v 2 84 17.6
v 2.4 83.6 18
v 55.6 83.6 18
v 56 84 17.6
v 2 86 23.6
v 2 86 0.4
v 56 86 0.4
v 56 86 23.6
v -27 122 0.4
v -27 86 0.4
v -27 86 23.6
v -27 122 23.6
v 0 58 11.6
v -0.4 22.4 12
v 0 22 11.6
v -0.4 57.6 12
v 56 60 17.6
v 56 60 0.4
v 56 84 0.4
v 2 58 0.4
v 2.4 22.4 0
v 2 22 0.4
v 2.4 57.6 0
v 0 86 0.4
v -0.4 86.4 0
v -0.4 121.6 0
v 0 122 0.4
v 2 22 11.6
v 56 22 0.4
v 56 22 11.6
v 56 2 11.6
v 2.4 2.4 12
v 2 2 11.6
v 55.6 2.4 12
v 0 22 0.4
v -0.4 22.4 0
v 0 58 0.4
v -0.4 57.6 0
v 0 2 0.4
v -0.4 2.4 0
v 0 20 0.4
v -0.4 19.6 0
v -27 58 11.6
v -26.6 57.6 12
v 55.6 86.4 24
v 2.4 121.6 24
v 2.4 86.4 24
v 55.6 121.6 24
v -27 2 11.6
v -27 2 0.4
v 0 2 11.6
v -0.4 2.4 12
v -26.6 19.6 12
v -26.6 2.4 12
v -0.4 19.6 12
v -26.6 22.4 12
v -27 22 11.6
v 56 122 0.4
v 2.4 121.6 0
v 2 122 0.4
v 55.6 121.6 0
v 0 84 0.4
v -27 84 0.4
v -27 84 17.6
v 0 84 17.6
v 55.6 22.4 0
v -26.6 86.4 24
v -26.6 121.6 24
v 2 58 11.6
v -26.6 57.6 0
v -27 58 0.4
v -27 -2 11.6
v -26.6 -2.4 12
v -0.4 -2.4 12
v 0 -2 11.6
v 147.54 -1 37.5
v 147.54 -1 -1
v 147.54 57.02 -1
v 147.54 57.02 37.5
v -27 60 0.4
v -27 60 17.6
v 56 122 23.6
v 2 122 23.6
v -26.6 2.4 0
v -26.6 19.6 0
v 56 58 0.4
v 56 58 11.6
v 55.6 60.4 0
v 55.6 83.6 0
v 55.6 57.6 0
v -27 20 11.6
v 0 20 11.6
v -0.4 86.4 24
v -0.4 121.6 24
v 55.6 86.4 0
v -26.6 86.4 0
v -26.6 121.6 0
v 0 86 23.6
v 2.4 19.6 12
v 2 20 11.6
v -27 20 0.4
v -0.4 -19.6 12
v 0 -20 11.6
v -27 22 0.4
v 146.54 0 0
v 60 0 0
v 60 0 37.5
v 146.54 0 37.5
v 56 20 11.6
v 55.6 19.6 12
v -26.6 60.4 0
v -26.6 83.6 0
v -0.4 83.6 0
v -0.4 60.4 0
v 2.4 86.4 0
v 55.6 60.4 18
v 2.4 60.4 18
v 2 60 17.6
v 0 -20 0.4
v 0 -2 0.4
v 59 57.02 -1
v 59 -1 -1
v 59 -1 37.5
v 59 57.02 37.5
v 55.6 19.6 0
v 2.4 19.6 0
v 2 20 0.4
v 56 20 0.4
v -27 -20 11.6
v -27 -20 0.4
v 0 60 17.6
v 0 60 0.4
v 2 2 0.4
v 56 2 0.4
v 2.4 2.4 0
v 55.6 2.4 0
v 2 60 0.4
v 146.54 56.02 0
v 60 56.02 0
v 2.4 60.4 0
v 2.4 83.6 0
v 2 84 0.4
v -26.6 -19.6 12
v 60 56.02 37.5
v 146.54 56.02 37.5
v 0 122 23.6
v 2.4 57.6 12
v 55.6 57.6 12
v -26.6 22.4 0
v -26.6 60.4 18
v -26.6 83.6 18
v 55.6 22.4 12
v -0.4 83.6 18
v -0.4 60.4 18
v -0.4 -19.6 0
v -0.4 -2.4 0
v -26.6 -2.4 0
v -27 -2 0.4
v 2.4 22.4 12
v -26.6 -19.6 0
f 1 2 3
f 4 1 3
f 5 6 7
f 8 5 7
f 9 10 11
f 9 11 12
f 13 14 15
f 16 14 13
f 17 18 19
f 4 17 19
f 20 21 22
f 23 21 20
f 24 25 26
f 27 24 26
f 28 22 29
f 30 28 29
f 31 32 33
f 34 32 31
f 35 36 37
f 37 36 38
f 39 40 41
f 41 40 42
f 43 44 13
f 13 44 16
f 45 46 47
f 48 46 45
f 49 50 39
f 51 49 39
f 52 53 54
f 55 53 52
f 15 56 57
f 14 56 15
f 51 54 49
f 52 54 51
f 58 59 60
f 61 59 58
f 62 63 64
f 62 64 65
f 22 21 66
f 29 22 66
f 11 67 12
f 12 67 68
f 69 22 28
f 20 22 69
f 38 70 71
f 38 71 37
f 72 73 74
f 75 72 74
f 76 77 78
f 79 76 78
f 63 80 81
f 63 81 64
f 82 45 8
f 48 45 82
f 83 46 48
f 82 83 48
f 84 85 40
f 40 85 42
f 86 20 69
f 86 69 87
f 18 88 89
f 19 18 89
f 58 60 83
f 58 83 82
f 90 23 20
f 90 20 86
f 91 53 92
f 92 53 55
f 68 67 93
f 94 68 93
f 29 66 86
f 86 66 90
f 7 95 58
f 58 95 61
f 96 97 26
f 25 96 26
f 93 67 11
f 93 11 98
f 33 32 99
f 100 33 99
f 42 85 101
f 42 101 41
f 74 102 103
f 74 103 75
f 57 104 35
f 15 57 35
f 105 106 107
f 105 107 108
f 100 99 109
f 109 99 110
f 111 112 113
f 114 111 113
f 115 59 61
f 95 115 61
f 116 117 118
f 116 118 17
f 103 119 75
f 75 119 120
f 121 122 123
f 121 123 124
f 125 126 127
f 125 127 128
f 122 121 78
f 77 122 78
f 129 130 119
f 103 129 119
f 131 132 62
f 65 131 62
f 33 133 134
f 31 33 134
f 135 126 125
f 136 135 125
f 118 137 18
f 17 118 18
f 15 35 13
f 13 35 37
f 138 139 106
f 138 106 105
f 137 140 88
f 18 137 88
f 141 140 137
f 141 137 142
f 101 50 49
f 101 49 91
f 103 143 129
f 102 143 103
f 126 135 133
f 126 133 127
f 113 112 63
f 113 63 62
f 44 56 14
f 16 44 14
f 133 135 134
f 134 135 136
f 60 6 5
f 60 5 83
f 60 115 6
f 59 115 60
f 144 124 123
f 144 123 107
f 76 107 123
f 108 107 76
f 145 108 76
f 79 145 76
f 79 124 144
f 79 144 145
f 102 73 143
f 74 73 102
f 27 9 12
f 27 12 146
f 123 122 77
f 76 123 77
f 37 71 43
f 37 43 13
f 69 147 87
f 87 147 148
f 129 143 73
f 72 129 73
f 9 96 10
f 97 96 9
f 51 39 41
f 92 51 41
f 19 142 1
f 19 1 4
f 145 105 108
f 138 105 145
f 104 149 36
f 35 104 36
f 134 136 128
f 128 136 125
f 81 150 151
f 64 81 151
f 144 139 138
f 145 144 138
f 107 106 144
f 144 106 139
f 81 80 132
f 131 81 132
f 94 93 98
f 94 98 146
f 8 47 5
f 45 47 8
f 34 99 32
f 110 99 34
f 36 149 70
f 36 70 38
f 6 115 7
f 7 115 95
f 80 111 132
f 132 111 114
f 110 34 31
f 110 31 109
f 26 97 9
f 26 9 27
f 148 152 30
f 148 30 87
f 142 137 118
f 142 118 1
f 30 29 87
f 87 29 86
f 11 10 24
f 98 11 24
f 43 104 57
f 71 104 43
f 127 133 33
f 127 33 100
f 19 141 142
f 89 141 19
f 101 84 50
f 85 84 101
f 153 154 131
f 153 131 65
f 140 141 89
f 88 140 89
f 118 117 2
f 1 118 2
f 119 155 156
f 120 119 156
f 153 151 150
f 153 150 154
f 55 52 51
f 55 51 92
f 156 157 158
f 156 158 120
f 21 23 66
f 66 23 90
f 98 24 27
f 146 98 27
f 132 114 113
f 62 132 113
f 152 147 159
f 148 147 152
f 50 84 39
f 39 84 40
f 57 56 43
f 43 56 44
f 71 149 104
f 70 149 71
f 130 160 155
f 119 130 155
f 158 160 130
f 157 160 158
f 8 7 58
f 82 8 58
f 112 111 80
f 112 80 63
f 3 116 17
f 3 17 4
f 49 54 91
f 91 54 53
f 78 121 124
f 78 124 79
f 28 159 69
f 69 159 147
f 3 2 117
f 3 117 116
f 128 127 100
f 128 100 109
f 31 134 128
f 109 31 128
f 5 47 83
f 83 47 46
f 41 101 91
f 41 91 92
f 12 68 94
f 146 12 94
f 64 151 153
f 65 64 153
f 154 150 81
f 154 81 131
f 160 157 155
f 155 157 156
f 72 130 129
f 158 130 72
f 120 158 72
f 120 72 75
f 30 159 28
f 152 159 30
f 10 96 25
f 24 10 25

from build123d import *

# Parameters (mm, degrees)
F9_W       = 27
F9_H       = 18
F10_DEPTH  = 12
F9_H_2     = 36
F9_W_2     = 54
F9_H_3     = 24
F11_DEPTH  = 18
F12_DEPTH  = 24
F13_DEPTH  = 12
F14_SIZE   = 0.4
F14_2_SIZE = 0.4
F14_3_SIZE = 0.4
F14_4_SIZE = 0.4
F14_5_SIZE = 0.4
F14_6_SIZE = 0.4
F14_7_SIZE = 0.4
F14_8_SIZE = 0.4
F14_9_SIZE = 0.4
F9_W_3     = 86.54
F9_H_4     = 56.02
F15_DEPTH  = 37.5
F16_T      = 1


with BuildPart() as f10:
    # F9 (on Top) → F10 (new body)
    with BuildSketch(Plane.XY):
        with Locations((-13.5, 11)):
            Rectangle(F9_W, F9_H)
    extrude(amount=F10_DEPTH)

    # F14#7
    f14_7_edges = [f10.edges().sort_by_distance(p)[0] for p in [
        (-13.5, 20, 12),
        (-27, 11, 12),
        (-13.5, 2, 12),
        (0, 11, 12),
        (-13.5, 20, 0),
        (-27, 11, 0),
        (-13.5, 2, 0),
        (0, 11, 0),
    ]]
    chamfer(f14_7_edges, length=F14_7_SIZE)


with BuildPart() as f10b:
    # F9 (on Top) → F10, piece 2 (new body)
    with BuildSketch(Plane.XY):
        with Locations((-13.5, 40)):
            Rectangle(F9_W, F9_H_2)
    extrude(amount=F10_DEPTH)

    # F14#6
    f14_6_edges = [f10b.edges().sort_by_distance(p)[0] for p in [
        (-13.5, 58, 12),
        (-27, 40, 12),
        (-13.5, 22, 12),
        (0, 40, 12),
        (-13.5, 58, 0),
        (-27, 40, 0),
        (-13.5, 22, 0),
        (0, 40, 0),
    ]]
    chamfer(f14_6_edges, length=F14_6_SIZE)


with BuildPart() as f10c:
    # F9 (on Top) → F10, piece 3 (new body)
    with BuildSketch(Plane.XY):
        with Locations((29, 40)):
            Rectangle(F9_W_2, F9_H_2)
    extrude(amount=F10_DEPTH)

    # F14#5
    f14_5_edges = [f10c.edges().sort_by_distance(p)[0] for p in [
        (29, 58, 12),
        (2, 40, 12),
        (29, 22, 12),
        (56, 40, 12),
        (29, 58, 0),
        (2, 40, 0),
        (29, 22, 0),
        (56, 40, 0),
    ]]
    chamfer(f14_5_edges, length=F14_5_SIZE)


with BuildPart() as f10d:
    # F9 (on Top) → F10, piece 4 (new body)
    with BuildSketch(Plane.XY):
        with Locations((29, 11)):
            Rectangle(F9_W_2, F9_H)
    extrude(amount=F10_DEPTH)

    # F14#8
    f14_8_edges = [f10d.edges().sort_by_distance(p)[0] for p in [
        (29, 20, 12),
        (2, 11, 12),
        (29, 2, 12),
        (56, 11, 12),
        (29, 20, 0),
        (2, 11, 0),
        (29, 2, 0),
        (56, 11, 0),
    ]]
    chamfer(f14_8_edges, length=F14_8_SIZE)


with BuildPart() as f11:
    # F9 (on Top) → F11 (new body)
    with BuildSketch(Plane.XY):
        with Locations((-13.5, 72)):
            Rectangle(F9_W, F9_H_3)
    extrude(amount=F11_DEPTH)

    # F14#3
    f14_3_edges = [f11.edges().sort_by_distance(p)[0] for p in [
        (-13.5, 84, 18),
        (-27, 72, 18),
        (-13.5, 60, 18),
        (0, 72, 18),
        (-13.5, 84, 0),
        (-27, 72, 0),
        (-13.5, 60, 0),
        (0, 72, 0),
    ]]
    chamfer(f14_3_edges, length=F14_3_SIZE)


with BuildPart() as f11b:
    # F9 (on Top) → F11, piece 2 (new body)
    with BuildSketch(Plane.XY):
        with Locations((29, 72)):
            Rectangle(F9_W_2, F9_H_3)
    extrude(amount=F11_DEPTH)

    # F14#4
    f14_4_edges = [f11b.edges().sort_by_distance(p)[0] for p in [
        (29, 84, 18),
        (2, 72, 18),
        (29, 60, 18),
        (56, 72, 18),
        (29, 84, 0),
        (2, 72, 0),
        (29, 60, 0),
        (56, 72, 0),
    ]]
    chamfer(f14_4_edges, length=F14_4_SIZE)


with BuildPart() as f12:
    # F9 (on Top) → F12 (new body)
    with BuildSketch(Plane.XY):
        with Locations((-13.5, 104)):
            Rectangle(F9_W, F9_H_2)
    extrude(amount=F12_DEPTH)

    # F14
    f14_edges = [f12.edges().sort_by_distance(p)[0] for p in [
        (-13.5, 122, 24),
        (-27, 104, 24),
        (-13.5, 86, 24),
        (0, 104, 24),
        (-13.5, 122, 0),
        (-27, 104, 0),
        (-13.5, 86, 0),
        (0, 104, 0),
    ]]
    chamfer(f14_edges, length=F14_SIZE)


with BuildPart() as f12b:
    # F9 (on Top) → F12, piece 2 (new body)
    with BuildSketch(Plane.XY):
        with Locations((29, 104)):
            Rectangle(F9_W_2, F9_H_2)
    extrude(amount=F12_DEPTH)

    # F14#2
    f14_2_edges = [f12b.edges().sort_by_distance(p)[0] for p in [
        (29, 122, 24),
        (2, 104, 24),
        (29, 86, 24),
        (56, 104, 24),
        (29, 122, 0),
        (2, 104, 0),
        (29, 86, 0),
        (56, 104, 0),
    ]]
    chamfer(f14_2_edges, length=F14_2_SIZE)


with BuildPart() as f13:
    # F9 (on Top) → F13 (new body)
    with BuildSketch(Plane.XY):
        with Locations((-13.5, -11)):
            Rectangle(F9_W, F9_H)
    extrude(amount=F13_DEPTH)

    # F14#9
    f14_9_edges = [f13.edges().sort_by_distance(p)[0] for p in [
        (-13.5, -20, 12),
        (0, -11, 12),
        (-13.5, -2, 12),
        (-27, -11, 12),
        (-13.5, -20, 0),
        (0, -11, 0),
        (-13.5, -2, 0),
        (-27, -11, 0),
    ]]
    chamfer(f14_9_edges, length=F14_9_SIZE)


with BuildPart() as f15:
    # F9 (on Top) → F15 (new body)
    with BuildSketch(Plane.XY):
        with Locations((103.27, 28.01)):
            Rectangle(F9_W_3, F9_H_4)
    extrude(amount=F15_DEPTH)

    # F16
    f16_openings = [f15.faces().sort_by_distance(p)[0] for p in [
        (103.27, 28.01, 37.5),
    ]]
    offset(amount=F16_T, openings=f16_openings, kind=Kind.INTERSECTION)


solid = Compound([f10.part, f10b.part, f10c.part, f10d.part, f11.part, f11b.part, f12.part, f12b.part, f13.part, f15.part])
